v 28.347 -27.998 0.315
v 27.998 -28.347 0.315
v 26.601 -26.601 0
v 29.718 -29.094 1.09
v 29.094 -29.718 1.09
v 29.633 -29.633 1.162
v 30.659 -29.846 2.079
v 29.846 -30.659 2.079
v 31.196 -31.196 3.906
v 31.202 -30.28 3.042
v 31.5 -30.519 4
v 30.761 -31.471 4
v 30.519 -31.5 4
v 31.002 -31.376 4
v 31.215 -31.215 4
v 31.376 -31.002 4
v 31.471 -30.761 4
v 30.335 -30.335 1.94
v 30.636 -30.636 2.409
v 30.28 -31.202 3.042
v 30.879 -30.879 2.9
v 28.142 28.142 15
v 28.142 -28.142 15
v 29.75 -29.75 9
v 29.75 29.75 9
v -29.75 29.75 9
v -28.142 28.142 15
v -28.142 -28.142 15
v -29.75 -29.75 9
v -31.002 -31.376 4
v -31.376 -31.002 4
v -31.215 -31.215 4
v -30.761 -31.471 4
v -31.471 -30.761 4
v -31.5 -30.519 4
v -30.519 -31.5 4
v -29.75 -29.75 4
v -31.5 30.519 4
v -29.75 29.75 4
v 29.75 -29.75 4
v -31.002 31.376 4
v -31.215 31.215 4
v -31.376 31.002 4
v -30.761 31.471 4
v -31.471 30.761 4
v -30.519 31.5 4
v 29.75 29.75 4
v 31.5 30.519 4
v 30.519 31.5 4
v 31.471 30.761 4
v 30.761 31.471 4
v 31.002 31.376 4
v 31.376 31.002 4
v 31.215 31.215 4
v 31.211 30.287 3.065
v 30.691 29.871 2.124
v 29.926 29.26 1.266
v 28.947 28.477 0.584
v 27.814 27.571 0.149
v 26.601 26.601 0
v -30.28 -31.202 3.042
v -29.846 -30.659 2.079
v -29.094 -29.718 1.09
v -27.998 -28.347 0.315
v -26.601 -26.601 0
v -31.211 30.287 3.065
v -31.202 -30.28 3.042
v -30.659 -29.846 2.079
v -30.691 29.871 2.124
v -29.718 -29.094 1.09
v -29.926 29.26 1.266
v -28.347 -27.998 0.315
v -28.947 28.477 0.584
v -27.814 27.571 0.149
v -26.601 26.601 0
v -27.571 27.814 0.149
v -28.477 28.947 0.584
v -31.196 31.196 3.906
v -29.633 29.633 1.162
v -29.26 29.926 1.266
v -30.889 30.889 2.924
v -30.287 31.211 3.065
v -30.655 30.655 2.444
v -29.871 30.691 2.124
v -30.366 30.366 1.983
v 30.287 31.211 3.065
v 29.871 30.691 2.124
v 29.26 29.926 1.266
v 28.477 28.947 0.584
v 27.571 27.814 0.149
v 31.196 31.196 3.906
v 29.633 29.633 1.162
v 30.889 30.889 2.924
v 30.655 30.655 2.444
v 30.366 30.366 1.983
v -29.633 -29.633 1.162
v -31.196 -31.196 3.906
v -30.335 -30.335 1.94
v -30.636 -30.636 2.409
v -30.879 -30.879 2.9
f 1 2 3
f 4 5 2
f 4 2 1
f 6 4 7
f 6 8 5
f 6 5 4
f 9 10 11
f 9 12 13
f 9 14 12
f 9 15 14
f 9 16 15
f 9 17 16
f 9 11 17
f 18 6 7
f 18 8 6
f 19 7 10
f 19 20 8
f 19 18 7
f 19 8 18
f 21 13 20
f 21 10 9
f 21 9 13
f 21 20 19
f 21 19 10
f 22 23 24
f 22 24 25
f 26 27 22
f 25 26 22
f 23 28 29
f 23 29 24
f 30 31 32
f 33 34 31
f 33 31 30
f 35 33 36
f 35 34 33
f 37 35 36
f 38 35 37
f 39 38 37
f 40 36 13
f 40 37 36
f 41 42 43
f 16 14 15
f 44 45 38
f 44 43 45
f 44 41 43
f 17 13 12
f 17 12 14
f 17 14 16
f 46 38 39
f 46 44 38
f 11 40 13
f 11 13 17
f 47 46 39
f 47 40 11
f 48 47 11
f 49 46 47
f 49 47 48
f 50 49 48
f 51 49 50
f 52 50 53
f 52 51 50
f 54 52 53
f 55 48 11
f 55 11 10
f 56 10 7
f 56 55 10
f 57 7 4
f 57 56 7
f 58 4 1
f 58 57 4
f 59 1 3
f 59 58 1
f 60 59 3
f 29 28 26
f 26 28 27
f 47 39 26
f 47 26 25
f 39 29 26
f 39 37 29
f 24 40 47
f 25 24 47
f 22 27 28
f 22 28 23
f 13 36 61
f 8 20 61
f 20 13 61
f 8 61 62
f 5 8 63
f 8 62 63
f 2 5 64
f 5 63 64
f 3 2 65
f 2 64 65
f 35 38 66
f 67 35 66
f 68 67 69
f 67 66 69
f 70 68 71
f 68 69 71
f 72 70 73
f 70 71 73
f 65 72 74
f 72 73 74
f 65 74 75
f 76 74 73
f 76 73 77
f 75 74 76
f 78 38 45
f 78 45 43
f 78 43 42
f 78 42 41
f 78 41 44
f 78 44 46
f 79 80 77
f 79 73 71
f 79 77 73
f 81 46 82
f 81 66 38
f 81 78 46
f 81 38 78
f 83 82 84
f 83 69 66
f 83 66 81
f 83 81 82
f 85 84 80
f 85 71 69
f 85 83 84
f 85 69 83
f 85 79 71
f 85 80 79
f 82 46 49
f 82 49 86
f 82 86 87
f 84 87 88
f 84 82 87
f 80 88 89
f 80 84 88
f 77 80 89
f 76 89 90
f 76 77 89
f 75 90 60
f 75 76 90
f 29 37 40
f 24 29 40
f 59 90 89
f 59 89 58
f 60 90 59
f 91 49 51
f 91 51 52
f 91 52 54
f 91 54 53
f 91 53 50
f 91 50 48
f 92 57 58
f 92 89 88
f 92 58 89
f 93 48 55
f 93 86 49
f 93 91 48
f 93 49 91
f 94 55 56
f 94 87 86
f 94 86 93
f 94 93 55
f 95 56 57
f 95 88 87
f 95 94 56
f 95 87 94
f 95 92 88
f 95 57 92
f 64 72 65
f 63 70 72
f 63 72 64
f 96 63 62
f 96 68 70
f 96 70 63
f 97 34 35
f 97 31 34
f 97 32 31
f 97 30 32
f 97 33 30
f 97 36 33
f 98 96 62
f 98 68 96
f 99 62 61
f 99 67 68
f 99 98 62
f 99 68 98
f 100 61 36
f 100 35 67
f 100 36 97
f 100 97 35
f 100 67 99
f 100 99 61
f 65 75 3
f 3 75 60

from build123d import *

# Parameters (mm, degrees)
F0_W        = 59.5
F0_H        = 59.5
F1_DEPTH    = 15
F0_W_2      = 63
F0_H_2      = 63
F2_DEPTH    = 4
F3_T1_DEPTH = 87.4948974279
F3_T3_DEPTH = 87.4948974279
F4_C1_SIZE2 = 1.6076951546
F4_C1_SIZE  = 6
F4_C2_SIZE2 = 1.6076951546
F4_C2_SIZE  = 6
F4_C3_SIZE2 = 1.6076951546
F4_C3_SIZE  = 6
F4_C4_SIZE2 = 1.6076951546
F4_C4_SIZE  = 6
F5_R        = 1


# Not quite as in the source:
# - a fillet or chamfer that OpenCascade refuses, or shapes differently, is made with other operations: its cross-section is extruded or revolved along the edge and cut away or added


with BuildPart() as f1:
    # F0 (on Top) → F1 (new body)
    with BuildSketch(Plane.XY):
        Rectangle(F0_W, F0_H)
    extrude(amount=F1_DEPTH)

    # F0 (on Top) → F2 (join)
    with BuildSketch(Plane.XY):
        Rectangle(F0_W_2, F0_H_2)
        Rectangle(F0_W, F0_H, mode=Mode.SUBTRACT)
    extrude(amount=F2_DEPTH)

    # F3: fillet of radius 5 on 4 edges, made by hand

    # F3_s2 → F3_t1 (cut)
    with BuildSketch(Plane.YZ.offset(-43.7474487139)):
        with BuildLine():
            ThreePointArc((-31.5, 4), (-29.7632981746, 1.1270166538), (-26.6010205144, 0))
            Line((-26.6010205144, 0), (-31.5, 0))
            Line((-31.5, 0), (-31.5, 4))
        make_face()
        with BuildLine():
            ThreePointArc((31.5, 4), (29.7632981746, 1.1270166538), (26.6010205144, 0))
            Line((26.6010205144, 0), (31.5, 0))
            Line((31.5, 0), (31.5, 4))
        make_face()
    extrude(amount=F3_T1_DEPTH, mode=Mode.SUBTRACT)

    # F3_s4 → F3_t3 (cut)
    with BuildSketch(Plane.XZ.offset(-43.7474487139)):
        with BuildLine():
            ThreePointArc((31.5, 4), (29.7632981746, 1.1270166538), (26.6010205144, 0))
            Line((26.6010205144, 0), (31.5, 0))
            Line((31.5, 0), (31.5, 4))
        make_face()
        with BuildLine():
            ThreePointArc((-31.5, 4), (-29.7632981746, 1.1270166538), (-26.6010205144, 0))
            Line((-26.6010205144, 0), (-31.5, 0))
            Line((-31.5, 0), (-31.5, 4))
        make_face()
    extrude(amount=F3_T3_DEPTH, mode=Mode.SUBTRACT)

    # F4: chamfer of 6 x 1.6076951546 on 4 edges, made by hand

    # F4_c1
    f4_c1_edges = [f1.edges().sort_by_distance(p)[0] for p in [
        (0, -29.75, 15),
    ]]
    f4_c1_side = f1.faces().sort_by_distance((0, -29.75, 14.9678460969))[0]
    chamfer(f4_c1_edges, length=F4_C1_SIZE, length2=F4_C1_SIZE2, reference=f4_c1_side)

    # F4_c2
    f4_c2_edges = [f1.edges().sort_by_distance(p)[0] for p in [
        (29.75, 0.8038475773, 15),
    ]]
    f4_c2_side = f1.faces().sort_by_distance((29.75, 0.8038475773, 14.9678460969))[0]
    chamfer(f4_c2_edges, length=F4_C2_SIZE, length2=F4_C2_SIZE2, reference=f4_c2_side)

    # F4_c3
    f4_c3_edges = [f1.edges().sort_by_distance(p)[0] for p in [
        (-0.8038475773, 29.75, 15),
    ]]
    f4_c3_side = f1.faces().sort_by_distance((-0.8038475773, 29.75, 14.9678460969))[0]
    chamfer(f4_c3_edges, length=F4_C3_SIZE, length2=F4_C3_SIZE2, reference=f4_c3_side)

    # F4_c4
    f4_c4_edges = [f1.edges().sort_by_distance(p)[0] for p in [
        (-29.75, 0, 15),
    ]]
    f4_c4_side = f1.faces().sort_by_distance((-29.75, 0, 14.9678460969))[0]
    chamfer(f4_c4_edges, length=F4_C4_SIZE, length2=F4_C4_SIZE2, reference=f4_c4_side)

    # F5
    f5_edges = [f1.edges().sort_by_distance(p)[0] for p in [
        (-29.517588, -29.517588, 0.938765),
        (-29.517588, 29.517588, 0.938765),
        (29.517588, 29.517588, 0.938765),
        (29.517588, -29.517588, 0.938765),
    ]]
    fillet(f5_edges, radius=F5_R)


solid = f1.part
